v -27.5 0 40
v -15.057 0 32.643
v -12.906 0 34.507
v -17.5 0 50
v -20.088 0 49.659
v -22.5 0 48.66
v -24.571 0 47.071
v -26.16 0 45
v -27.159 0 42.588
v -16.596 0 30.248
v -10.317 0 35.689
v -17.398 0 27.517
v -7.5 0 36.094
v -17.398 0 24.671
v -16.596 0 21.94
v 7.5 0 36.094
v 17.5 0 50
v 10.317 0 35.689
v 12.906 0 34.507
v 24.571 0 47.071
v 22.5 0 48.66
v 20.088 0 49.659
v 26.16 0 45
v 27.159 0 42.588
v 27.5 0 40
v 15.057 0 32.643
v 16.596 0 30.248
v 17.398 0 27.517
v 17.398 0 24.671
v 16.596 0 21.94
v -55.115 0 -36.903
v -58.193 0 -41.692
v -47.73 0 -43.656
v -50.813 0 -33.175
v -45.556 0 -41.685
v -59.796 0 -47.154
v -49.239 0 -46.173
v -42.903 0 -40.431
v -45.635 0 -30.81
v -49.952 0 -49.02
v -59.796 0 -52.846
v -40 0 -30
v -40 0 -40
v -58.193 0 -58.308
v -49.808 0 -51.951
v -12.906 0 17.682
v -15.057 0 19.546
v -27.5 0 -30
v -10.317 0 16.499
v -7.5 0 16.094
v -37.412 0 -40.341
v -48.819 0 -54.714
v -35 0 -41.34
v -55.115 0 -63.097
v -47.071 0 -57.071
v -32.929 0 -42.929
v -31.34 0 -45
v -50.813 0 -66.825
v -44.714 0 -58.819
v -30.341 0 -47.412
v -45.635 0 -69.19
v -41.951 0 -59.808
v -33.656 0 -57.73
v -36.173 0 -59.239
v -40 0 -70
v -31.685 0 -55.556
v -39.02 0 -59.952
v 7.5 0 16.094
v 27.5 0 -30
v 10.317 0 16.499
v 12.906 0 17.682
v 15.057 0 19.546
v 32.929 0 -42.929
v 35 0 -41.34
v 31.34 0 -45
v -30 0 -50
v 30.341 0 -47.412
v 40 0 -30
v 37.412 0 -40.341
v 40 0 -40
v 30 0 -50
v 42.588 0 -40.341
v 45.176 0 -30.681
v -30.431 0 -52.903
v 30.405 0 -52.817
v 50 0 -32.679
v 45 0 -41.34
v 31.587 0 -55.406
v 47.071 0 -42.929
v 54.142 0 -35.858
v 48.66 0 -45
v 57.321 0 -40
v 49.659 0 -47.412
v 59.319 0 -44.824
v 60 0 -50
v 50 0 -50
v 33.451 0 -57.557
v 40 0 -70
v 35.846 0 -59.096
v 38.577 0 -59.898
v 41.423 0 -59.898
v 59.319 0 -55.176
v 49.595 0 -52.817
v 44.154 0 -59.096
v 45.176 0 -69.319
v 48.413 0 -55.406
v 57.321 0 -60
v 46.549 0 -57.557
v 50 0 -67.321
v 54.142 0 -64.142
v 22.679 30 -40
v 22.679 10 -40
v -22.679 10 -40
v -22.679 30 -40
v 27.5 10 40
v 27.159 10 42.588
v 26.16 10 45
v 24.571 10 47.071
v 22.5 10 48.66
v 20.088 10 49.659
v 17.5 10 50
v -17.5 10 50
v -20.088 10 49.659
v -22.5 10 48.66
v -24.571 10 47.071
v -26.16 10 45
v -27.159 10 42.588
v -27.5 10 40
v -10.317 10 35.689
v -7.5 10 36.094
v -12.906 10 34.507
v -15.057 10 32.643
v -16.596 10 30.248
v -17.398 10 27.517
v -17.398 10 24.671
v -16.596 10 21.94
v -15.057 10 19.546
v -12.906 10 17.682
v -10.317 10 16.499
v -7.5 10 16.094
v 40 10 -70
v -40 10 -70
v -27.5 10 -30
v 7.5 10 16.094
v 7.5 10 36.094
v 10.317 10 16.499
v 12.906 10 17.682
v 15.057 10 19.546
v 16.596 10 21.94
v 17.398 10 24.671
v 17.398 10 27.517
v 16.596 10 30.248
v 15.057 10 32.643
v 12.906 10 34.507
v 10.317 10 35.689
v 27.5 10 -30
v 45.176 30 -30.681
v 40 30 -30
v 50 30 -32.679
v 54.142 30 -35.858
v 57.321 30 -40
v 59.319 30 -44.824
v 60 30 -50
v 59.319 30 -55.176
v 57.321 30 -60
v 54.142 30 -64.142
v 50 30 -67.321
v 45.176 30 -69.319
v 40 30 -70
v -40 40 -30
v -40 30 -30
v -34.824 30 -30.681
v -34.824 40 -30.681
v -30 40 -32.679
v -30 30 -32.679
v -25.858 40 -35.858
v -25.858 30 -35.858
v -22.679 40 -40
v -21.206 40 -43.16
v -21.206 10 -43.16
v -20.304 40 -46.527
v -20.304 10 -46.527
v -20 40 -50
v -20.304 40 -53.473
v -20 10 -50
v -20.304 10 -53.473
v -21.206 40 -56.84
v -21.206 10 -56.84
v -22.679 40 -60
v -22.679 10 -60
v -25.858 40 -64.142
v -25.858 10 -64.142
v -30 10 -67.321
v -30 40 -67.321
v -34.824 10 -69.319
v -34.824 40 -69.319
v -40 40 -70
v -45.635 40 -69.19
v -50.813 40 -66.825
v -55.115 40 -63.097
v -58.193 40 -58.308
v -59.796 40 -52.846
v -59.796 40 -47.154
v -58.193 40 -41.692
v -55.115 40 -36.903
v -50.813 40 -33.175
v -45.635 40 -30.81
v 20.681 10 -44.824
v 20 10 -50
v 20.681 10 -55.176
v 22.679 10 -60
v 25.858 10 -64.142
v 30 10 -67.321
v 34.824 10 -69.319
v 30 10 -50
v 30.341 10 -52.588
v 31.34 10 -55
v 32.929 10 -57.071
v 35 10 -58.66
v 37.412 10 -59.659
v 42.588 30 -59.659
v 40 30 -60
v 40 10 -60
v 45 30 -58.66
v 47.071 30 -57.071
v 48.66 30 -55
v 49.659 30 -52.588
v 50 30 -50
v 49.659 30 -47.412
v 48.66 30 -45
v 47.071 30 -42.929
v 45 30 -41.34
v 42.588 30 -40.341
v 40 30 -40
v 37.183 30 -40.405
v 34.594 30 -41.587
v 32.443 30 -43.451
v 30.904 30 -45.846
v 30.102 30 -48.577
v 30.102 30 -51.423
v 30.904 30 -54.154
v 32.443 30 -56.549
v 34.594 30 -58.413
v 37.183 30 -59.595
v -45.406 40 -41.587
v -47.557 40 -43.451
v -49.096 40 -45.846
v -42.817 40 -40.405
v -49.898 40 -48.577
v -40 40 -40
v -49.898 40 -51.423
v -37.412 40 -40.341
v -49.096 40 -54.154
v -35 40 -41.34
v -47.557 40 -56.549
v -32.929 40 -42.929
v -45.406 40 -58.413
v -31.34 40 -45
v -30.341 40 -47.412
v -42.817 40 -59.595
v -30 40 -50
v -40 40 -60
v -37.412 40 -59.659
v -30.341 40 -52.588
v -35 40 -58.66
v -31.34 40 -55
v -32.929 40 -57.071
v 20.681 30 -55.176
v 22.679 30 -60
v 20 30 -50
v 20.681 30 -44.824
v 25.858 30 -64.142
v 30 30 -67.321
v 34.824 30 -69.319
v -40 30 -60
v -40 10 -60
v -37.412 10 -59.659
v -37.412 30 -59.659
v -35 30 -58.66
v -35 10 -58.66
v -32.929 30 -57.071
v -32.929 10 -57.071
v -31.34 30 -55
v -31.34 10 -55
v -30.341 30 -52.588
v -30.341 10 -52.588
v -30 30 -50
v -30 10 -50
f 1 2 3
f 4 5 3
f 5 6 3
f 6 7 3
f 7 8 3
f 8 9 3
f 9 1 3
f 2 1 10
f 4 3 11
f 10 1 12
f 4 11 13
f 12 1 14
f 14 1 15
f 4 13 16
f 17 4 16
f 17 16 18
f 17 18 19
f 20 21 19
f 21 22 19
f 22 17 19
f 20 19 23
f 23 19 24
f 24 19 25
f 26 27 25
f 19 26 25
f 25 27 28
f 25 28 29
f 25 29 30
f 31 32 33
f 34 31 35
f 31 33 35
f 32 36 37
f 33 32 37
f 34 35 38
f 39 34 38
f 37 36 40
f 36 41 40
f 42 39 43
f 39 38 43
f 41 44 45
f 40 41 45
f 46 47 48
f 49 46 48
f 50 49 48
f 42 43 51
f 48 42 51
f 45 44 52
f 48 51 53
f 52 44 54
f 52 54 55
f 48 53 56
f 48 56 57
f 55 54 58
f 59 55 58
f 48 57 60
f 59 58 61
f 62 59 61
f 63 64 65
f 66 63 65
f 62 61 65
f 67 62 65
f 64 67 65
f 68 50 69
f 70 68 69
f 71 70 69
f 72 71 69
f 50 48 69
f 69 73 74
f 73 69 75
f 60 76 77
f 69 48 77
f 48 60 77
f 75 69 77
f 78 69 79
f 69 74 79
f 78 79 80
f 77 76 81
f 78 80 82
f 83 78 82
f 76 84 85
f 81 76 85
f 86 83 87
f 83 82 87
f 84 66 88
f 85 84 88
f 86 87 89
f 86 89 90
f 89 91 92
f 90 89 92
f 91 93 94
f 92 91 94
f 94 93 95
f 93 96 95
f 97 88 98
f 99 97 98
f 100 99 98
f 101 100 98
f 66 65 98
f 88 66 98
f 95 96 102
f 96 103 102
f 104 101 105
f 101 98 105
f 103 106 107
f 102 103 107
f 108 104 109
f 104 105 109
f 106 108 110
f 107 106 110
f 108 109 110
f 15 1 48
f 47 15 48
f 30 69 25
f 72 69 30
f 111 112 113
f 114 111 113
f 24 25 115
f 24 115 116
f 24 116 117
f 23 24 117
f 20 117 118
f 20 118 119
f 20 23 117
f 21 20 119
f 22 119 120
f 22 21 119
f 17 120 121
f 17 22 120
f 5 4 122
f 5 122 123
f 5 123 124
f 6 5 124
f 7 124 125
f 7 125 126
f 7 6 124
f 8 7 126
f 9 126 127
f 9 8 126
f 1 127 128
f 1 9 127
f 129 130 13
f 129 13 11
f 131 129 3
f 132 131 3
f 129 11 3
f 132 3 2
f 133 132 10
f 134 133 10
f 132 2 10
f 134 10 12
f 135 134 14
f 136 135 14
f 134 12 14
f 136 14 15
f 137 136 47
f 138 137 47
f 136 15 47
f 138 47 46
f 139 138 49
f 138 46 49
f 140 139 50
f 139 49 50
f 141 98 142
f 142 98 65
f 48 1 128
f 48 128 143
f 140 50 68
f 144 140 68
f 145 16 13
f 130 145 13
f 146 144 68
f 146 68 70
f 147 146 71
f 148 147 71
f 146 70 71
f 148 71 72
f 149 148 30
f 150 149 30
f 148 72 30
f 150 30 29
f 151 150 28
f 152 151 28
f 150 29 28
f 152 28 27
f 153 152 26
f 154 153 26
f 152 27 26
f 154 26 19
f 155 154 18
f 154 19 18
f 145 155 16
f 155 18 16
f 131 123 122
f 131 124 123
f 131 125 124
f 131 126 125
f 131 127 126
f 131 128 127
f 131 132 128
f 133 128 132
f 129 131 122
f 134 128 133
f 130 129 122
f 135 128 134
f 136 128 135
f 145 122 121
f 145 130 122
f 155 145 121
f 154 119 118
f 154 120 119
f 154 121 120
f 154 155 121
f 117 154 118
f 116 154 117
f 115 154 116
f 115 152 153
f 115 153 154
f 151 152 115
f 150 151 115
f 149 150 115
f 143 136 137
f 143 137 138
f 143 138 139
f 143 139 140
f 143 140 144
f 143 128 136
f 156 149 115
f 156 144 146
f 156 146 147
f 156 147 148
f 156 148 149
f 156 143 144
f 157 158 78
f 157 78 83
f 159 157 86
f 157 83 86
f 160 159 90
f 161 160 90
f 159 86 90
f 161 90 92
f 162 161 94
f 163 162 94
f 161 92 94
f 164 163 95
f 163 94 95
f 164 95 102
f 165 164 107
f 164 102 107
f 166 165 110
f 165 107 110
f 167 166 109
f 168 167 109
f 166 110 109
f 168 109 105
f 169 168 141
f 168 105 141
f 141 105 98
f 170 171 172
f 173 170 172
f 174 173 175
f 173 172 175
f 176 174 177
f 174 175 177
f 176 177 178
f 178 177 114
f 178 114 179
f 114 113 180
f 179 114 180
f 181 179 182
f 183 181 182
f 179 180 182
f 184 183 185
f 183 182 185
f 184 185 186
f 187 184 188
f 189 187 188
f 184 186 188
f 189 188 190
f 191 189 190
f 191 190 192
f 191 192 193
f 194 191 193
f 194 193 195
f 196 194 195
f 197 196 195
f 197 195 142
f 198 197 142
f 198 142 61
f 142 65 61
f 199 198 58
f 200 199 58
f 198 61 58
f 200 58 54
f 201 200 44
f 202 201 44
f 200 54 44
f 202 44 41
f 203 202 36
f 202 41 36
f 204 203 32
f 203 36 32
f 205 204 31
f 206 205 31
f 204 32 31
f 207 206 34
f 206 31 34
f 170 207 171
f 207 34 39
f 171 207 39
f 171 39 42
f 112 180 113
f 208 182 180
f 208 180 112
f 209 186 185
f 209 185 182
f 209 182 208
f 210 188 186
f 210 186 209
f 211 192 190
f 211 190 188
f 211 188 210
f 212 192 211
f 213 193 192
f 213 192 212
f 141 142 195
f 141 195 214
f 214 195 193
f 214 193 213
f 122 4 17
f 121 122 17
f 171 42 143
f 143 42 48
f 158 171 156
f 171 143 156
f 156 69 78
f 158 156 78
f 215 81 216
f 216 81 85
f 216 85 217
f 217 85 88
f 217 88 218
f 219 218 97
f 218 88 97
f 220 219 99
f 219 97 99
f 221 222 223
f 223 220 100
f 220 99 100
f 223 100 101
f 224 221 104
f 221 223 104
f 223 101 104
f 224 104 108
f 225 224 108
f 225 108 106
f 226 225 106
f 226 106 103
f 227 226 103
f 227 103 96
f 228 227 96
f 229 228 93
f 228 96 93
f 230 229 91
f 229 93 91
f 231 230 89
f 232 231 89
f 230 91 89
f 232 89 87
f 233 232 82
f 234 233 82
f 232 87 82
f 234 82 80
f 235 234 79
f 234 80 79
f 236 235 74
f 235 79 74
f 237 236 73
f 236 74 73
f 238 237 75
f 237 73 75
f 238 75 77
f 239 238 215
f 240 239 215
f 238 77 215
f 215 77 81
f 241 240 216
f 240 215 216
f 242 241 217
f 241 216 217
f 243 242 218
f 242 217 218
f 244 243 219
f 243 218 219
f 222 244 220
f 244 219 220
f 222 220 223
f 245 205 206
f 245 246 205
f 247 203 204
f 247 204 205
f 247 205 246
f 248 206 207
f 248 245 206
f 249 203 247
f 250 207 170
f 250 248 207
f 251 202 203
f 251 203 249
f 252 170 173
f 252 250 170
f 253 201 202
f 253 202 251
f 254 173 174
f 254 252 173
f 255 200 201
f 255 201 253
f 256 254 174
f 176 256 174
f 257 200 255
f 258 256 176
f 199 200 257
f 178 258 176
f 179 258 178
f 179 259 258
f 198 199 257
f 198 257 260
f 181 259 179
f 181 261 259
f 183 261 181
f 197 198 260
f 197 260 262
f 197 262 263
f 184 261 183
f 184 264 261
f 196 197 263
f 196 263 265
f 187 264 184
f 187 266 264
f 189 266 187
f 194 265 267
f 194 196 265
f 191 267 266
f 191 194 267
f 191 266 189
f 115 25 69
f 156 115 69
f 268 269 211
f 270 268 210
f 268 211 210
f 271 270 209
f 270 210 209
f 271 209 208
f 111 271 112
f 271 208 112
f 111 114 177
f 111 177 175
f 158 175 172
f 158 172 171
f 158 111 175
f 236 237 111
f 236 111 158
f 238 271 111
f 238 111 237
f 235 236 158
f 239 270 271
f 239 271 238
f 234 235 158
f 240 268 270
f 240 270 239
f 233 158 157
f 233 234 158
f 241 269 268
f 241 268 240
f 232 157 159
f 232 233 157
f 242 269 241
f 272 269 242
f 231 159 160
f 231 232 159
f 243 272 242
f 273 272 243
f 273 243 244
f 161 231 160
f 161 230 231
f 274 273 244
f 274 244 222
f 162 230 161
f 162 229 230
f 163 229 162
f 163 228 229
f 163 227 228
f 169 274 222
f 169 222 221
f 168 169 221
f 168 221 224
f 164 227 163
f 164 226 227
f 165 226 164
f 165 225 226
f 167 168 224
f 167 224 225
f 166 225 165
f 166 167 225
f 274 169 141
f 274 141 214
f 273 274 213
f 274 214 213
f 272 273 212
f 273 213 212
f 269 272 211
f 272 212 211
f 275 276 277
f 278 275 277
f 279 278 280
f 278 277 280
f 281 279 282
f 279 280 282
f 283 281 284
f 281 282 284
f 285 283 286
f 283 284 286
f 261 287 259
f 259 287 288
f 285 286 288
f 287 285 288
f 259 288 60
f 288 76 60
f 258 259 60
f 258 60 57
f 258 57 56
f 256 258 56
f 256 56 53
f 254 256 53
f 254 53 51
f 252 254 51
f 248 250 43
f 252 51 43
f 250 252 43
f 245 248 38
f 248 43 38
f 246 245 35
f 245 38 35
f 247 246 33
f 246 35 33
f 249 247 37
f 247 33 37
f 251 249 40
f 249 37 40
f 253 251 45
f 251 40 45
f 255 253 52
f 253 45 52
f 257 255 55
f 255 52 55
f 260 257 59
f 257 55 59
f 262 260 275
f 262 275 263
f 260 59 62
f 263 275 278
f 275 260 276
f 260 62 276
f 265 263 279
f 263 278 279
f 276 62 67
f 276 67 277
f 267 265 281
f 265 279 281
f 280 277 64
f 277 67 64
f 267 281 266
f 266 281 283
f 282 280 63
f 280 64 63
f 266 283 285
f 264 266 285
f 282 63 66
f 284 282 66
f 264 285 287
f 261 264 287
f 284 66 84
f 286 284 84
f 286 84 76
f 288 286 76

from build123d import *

# Parameters (mm, degrees)
SKETCH1_R           = 10
BOSS_EXTRUDE1_DEPTH = 10
SKETCH2_R           = 10
BOSS_EXTRUDE2_DEPTH = 20
SKETCH2_3_R         = 20
SKETCH2_3_R_2       = 10
BOSS_EXTRUDE3_DEPTH = 30
FILLET1_R           = 10


with BuildPart() as part:
    # Sketch1 → Boss-Extrude1 (new body)
    with BuildSketch(Plane(origin=(0, 0, 0), x_dir=(1, 0, 0), z_dir=(0, 1, 0))):
        with BuildLine():
            Line((-27.5, 30), (-27.5, -50))
            Line((-27.5, -50), (27.5, -50))
            Line((27.5, -50), (27.5, 30))
            Line((27.5, 30), (40, 30))
            ThreePointArc((40, 30), (60, 50), (40, 70))
            Line((40, 70), (-40, 70))
            ThreePointArc((-40, 70), (-60, 50), (-40, 30))
            Line((-40, 30), (-27.5, 30))
        make_face()
        with BuildLine():
            ThreePointArc((-7.5, -36.09420366), (-17.5, -26.09420366), (-7.5, -16.09420366))
            Line((-7.5, -16.09420366), (7.5, -16.09420366))
            ThreePointArc((7.5, -16.09420366), (17.5, -26.09420366), (7.5, -36.09420366))
            Line((7.5, -36.09420366), (-7.5, -36.09420366))
        make_face(mode=Mode.SUBTRACT)
        with Locations((-40, 50)):
            Circle(SKETCH1_R, mode=Mode.SUBTRACT)
        with Locations((40, 50)):
            Circle(SKETCH1_R, mode=Mode.SUBTRACT)
    extrude(amount=BOSS_EXTRUDE1_DEPTH)

    # Sketch2 → Boss-Extrude2 (add)
    with BuildSketch(Plane(origin=(0, 10, 0), x_dir=(1, 0, 0), z_dir=(0, 1, 0))):
        with BuildLine():
            Line((22.679491924, 40), (-22.679491924, 40))
            ThreePointArc((-22.679491924, 40), (-50, 67.320508076), (-40, 30))
            Line((-40, 30), (40, 30))
            ThreePointArc((40, 30), (50, 67.320508076), (22.679491924, 40))
        make_face()
        with Locations((40, 50)):
            Circle(SKETCH2_R, mode=Mode.SUBTRACT)
        with Locations((-40, 50)):
            Circle(SKETCH2_R, mode=Mode.SUBTRACT)
    extrude(amount=BOSS_EXTRUDE2_DEPTH)

    # Sketch2<3> → Boss-Extrude3 (add)
    with BuildSketch(Plane(origin=(0, 10, 0), x_dir=(1, 0, 0), z_dir=(0, 1, 0))):
        with Locations((-40, 50)):
            Circle(SKETCH2_3_R)
        with Locations((-40, 50)):
            Circle(SKETCH2_3_R_2, mode=Mode.SUBTRACT)
    extrude(amount=BOSS_EXTRUDE3_DEPTH)

    # Fillet1
    fillet1_edges = [part.edges().sort_by_distance(p)[0] for p in [
        (-27.5, 5, 50),
        (27.5, 5, 50),
    ]]
    fillet(fillet1_edges, radius=FILLET1_R)


solid = part.part
